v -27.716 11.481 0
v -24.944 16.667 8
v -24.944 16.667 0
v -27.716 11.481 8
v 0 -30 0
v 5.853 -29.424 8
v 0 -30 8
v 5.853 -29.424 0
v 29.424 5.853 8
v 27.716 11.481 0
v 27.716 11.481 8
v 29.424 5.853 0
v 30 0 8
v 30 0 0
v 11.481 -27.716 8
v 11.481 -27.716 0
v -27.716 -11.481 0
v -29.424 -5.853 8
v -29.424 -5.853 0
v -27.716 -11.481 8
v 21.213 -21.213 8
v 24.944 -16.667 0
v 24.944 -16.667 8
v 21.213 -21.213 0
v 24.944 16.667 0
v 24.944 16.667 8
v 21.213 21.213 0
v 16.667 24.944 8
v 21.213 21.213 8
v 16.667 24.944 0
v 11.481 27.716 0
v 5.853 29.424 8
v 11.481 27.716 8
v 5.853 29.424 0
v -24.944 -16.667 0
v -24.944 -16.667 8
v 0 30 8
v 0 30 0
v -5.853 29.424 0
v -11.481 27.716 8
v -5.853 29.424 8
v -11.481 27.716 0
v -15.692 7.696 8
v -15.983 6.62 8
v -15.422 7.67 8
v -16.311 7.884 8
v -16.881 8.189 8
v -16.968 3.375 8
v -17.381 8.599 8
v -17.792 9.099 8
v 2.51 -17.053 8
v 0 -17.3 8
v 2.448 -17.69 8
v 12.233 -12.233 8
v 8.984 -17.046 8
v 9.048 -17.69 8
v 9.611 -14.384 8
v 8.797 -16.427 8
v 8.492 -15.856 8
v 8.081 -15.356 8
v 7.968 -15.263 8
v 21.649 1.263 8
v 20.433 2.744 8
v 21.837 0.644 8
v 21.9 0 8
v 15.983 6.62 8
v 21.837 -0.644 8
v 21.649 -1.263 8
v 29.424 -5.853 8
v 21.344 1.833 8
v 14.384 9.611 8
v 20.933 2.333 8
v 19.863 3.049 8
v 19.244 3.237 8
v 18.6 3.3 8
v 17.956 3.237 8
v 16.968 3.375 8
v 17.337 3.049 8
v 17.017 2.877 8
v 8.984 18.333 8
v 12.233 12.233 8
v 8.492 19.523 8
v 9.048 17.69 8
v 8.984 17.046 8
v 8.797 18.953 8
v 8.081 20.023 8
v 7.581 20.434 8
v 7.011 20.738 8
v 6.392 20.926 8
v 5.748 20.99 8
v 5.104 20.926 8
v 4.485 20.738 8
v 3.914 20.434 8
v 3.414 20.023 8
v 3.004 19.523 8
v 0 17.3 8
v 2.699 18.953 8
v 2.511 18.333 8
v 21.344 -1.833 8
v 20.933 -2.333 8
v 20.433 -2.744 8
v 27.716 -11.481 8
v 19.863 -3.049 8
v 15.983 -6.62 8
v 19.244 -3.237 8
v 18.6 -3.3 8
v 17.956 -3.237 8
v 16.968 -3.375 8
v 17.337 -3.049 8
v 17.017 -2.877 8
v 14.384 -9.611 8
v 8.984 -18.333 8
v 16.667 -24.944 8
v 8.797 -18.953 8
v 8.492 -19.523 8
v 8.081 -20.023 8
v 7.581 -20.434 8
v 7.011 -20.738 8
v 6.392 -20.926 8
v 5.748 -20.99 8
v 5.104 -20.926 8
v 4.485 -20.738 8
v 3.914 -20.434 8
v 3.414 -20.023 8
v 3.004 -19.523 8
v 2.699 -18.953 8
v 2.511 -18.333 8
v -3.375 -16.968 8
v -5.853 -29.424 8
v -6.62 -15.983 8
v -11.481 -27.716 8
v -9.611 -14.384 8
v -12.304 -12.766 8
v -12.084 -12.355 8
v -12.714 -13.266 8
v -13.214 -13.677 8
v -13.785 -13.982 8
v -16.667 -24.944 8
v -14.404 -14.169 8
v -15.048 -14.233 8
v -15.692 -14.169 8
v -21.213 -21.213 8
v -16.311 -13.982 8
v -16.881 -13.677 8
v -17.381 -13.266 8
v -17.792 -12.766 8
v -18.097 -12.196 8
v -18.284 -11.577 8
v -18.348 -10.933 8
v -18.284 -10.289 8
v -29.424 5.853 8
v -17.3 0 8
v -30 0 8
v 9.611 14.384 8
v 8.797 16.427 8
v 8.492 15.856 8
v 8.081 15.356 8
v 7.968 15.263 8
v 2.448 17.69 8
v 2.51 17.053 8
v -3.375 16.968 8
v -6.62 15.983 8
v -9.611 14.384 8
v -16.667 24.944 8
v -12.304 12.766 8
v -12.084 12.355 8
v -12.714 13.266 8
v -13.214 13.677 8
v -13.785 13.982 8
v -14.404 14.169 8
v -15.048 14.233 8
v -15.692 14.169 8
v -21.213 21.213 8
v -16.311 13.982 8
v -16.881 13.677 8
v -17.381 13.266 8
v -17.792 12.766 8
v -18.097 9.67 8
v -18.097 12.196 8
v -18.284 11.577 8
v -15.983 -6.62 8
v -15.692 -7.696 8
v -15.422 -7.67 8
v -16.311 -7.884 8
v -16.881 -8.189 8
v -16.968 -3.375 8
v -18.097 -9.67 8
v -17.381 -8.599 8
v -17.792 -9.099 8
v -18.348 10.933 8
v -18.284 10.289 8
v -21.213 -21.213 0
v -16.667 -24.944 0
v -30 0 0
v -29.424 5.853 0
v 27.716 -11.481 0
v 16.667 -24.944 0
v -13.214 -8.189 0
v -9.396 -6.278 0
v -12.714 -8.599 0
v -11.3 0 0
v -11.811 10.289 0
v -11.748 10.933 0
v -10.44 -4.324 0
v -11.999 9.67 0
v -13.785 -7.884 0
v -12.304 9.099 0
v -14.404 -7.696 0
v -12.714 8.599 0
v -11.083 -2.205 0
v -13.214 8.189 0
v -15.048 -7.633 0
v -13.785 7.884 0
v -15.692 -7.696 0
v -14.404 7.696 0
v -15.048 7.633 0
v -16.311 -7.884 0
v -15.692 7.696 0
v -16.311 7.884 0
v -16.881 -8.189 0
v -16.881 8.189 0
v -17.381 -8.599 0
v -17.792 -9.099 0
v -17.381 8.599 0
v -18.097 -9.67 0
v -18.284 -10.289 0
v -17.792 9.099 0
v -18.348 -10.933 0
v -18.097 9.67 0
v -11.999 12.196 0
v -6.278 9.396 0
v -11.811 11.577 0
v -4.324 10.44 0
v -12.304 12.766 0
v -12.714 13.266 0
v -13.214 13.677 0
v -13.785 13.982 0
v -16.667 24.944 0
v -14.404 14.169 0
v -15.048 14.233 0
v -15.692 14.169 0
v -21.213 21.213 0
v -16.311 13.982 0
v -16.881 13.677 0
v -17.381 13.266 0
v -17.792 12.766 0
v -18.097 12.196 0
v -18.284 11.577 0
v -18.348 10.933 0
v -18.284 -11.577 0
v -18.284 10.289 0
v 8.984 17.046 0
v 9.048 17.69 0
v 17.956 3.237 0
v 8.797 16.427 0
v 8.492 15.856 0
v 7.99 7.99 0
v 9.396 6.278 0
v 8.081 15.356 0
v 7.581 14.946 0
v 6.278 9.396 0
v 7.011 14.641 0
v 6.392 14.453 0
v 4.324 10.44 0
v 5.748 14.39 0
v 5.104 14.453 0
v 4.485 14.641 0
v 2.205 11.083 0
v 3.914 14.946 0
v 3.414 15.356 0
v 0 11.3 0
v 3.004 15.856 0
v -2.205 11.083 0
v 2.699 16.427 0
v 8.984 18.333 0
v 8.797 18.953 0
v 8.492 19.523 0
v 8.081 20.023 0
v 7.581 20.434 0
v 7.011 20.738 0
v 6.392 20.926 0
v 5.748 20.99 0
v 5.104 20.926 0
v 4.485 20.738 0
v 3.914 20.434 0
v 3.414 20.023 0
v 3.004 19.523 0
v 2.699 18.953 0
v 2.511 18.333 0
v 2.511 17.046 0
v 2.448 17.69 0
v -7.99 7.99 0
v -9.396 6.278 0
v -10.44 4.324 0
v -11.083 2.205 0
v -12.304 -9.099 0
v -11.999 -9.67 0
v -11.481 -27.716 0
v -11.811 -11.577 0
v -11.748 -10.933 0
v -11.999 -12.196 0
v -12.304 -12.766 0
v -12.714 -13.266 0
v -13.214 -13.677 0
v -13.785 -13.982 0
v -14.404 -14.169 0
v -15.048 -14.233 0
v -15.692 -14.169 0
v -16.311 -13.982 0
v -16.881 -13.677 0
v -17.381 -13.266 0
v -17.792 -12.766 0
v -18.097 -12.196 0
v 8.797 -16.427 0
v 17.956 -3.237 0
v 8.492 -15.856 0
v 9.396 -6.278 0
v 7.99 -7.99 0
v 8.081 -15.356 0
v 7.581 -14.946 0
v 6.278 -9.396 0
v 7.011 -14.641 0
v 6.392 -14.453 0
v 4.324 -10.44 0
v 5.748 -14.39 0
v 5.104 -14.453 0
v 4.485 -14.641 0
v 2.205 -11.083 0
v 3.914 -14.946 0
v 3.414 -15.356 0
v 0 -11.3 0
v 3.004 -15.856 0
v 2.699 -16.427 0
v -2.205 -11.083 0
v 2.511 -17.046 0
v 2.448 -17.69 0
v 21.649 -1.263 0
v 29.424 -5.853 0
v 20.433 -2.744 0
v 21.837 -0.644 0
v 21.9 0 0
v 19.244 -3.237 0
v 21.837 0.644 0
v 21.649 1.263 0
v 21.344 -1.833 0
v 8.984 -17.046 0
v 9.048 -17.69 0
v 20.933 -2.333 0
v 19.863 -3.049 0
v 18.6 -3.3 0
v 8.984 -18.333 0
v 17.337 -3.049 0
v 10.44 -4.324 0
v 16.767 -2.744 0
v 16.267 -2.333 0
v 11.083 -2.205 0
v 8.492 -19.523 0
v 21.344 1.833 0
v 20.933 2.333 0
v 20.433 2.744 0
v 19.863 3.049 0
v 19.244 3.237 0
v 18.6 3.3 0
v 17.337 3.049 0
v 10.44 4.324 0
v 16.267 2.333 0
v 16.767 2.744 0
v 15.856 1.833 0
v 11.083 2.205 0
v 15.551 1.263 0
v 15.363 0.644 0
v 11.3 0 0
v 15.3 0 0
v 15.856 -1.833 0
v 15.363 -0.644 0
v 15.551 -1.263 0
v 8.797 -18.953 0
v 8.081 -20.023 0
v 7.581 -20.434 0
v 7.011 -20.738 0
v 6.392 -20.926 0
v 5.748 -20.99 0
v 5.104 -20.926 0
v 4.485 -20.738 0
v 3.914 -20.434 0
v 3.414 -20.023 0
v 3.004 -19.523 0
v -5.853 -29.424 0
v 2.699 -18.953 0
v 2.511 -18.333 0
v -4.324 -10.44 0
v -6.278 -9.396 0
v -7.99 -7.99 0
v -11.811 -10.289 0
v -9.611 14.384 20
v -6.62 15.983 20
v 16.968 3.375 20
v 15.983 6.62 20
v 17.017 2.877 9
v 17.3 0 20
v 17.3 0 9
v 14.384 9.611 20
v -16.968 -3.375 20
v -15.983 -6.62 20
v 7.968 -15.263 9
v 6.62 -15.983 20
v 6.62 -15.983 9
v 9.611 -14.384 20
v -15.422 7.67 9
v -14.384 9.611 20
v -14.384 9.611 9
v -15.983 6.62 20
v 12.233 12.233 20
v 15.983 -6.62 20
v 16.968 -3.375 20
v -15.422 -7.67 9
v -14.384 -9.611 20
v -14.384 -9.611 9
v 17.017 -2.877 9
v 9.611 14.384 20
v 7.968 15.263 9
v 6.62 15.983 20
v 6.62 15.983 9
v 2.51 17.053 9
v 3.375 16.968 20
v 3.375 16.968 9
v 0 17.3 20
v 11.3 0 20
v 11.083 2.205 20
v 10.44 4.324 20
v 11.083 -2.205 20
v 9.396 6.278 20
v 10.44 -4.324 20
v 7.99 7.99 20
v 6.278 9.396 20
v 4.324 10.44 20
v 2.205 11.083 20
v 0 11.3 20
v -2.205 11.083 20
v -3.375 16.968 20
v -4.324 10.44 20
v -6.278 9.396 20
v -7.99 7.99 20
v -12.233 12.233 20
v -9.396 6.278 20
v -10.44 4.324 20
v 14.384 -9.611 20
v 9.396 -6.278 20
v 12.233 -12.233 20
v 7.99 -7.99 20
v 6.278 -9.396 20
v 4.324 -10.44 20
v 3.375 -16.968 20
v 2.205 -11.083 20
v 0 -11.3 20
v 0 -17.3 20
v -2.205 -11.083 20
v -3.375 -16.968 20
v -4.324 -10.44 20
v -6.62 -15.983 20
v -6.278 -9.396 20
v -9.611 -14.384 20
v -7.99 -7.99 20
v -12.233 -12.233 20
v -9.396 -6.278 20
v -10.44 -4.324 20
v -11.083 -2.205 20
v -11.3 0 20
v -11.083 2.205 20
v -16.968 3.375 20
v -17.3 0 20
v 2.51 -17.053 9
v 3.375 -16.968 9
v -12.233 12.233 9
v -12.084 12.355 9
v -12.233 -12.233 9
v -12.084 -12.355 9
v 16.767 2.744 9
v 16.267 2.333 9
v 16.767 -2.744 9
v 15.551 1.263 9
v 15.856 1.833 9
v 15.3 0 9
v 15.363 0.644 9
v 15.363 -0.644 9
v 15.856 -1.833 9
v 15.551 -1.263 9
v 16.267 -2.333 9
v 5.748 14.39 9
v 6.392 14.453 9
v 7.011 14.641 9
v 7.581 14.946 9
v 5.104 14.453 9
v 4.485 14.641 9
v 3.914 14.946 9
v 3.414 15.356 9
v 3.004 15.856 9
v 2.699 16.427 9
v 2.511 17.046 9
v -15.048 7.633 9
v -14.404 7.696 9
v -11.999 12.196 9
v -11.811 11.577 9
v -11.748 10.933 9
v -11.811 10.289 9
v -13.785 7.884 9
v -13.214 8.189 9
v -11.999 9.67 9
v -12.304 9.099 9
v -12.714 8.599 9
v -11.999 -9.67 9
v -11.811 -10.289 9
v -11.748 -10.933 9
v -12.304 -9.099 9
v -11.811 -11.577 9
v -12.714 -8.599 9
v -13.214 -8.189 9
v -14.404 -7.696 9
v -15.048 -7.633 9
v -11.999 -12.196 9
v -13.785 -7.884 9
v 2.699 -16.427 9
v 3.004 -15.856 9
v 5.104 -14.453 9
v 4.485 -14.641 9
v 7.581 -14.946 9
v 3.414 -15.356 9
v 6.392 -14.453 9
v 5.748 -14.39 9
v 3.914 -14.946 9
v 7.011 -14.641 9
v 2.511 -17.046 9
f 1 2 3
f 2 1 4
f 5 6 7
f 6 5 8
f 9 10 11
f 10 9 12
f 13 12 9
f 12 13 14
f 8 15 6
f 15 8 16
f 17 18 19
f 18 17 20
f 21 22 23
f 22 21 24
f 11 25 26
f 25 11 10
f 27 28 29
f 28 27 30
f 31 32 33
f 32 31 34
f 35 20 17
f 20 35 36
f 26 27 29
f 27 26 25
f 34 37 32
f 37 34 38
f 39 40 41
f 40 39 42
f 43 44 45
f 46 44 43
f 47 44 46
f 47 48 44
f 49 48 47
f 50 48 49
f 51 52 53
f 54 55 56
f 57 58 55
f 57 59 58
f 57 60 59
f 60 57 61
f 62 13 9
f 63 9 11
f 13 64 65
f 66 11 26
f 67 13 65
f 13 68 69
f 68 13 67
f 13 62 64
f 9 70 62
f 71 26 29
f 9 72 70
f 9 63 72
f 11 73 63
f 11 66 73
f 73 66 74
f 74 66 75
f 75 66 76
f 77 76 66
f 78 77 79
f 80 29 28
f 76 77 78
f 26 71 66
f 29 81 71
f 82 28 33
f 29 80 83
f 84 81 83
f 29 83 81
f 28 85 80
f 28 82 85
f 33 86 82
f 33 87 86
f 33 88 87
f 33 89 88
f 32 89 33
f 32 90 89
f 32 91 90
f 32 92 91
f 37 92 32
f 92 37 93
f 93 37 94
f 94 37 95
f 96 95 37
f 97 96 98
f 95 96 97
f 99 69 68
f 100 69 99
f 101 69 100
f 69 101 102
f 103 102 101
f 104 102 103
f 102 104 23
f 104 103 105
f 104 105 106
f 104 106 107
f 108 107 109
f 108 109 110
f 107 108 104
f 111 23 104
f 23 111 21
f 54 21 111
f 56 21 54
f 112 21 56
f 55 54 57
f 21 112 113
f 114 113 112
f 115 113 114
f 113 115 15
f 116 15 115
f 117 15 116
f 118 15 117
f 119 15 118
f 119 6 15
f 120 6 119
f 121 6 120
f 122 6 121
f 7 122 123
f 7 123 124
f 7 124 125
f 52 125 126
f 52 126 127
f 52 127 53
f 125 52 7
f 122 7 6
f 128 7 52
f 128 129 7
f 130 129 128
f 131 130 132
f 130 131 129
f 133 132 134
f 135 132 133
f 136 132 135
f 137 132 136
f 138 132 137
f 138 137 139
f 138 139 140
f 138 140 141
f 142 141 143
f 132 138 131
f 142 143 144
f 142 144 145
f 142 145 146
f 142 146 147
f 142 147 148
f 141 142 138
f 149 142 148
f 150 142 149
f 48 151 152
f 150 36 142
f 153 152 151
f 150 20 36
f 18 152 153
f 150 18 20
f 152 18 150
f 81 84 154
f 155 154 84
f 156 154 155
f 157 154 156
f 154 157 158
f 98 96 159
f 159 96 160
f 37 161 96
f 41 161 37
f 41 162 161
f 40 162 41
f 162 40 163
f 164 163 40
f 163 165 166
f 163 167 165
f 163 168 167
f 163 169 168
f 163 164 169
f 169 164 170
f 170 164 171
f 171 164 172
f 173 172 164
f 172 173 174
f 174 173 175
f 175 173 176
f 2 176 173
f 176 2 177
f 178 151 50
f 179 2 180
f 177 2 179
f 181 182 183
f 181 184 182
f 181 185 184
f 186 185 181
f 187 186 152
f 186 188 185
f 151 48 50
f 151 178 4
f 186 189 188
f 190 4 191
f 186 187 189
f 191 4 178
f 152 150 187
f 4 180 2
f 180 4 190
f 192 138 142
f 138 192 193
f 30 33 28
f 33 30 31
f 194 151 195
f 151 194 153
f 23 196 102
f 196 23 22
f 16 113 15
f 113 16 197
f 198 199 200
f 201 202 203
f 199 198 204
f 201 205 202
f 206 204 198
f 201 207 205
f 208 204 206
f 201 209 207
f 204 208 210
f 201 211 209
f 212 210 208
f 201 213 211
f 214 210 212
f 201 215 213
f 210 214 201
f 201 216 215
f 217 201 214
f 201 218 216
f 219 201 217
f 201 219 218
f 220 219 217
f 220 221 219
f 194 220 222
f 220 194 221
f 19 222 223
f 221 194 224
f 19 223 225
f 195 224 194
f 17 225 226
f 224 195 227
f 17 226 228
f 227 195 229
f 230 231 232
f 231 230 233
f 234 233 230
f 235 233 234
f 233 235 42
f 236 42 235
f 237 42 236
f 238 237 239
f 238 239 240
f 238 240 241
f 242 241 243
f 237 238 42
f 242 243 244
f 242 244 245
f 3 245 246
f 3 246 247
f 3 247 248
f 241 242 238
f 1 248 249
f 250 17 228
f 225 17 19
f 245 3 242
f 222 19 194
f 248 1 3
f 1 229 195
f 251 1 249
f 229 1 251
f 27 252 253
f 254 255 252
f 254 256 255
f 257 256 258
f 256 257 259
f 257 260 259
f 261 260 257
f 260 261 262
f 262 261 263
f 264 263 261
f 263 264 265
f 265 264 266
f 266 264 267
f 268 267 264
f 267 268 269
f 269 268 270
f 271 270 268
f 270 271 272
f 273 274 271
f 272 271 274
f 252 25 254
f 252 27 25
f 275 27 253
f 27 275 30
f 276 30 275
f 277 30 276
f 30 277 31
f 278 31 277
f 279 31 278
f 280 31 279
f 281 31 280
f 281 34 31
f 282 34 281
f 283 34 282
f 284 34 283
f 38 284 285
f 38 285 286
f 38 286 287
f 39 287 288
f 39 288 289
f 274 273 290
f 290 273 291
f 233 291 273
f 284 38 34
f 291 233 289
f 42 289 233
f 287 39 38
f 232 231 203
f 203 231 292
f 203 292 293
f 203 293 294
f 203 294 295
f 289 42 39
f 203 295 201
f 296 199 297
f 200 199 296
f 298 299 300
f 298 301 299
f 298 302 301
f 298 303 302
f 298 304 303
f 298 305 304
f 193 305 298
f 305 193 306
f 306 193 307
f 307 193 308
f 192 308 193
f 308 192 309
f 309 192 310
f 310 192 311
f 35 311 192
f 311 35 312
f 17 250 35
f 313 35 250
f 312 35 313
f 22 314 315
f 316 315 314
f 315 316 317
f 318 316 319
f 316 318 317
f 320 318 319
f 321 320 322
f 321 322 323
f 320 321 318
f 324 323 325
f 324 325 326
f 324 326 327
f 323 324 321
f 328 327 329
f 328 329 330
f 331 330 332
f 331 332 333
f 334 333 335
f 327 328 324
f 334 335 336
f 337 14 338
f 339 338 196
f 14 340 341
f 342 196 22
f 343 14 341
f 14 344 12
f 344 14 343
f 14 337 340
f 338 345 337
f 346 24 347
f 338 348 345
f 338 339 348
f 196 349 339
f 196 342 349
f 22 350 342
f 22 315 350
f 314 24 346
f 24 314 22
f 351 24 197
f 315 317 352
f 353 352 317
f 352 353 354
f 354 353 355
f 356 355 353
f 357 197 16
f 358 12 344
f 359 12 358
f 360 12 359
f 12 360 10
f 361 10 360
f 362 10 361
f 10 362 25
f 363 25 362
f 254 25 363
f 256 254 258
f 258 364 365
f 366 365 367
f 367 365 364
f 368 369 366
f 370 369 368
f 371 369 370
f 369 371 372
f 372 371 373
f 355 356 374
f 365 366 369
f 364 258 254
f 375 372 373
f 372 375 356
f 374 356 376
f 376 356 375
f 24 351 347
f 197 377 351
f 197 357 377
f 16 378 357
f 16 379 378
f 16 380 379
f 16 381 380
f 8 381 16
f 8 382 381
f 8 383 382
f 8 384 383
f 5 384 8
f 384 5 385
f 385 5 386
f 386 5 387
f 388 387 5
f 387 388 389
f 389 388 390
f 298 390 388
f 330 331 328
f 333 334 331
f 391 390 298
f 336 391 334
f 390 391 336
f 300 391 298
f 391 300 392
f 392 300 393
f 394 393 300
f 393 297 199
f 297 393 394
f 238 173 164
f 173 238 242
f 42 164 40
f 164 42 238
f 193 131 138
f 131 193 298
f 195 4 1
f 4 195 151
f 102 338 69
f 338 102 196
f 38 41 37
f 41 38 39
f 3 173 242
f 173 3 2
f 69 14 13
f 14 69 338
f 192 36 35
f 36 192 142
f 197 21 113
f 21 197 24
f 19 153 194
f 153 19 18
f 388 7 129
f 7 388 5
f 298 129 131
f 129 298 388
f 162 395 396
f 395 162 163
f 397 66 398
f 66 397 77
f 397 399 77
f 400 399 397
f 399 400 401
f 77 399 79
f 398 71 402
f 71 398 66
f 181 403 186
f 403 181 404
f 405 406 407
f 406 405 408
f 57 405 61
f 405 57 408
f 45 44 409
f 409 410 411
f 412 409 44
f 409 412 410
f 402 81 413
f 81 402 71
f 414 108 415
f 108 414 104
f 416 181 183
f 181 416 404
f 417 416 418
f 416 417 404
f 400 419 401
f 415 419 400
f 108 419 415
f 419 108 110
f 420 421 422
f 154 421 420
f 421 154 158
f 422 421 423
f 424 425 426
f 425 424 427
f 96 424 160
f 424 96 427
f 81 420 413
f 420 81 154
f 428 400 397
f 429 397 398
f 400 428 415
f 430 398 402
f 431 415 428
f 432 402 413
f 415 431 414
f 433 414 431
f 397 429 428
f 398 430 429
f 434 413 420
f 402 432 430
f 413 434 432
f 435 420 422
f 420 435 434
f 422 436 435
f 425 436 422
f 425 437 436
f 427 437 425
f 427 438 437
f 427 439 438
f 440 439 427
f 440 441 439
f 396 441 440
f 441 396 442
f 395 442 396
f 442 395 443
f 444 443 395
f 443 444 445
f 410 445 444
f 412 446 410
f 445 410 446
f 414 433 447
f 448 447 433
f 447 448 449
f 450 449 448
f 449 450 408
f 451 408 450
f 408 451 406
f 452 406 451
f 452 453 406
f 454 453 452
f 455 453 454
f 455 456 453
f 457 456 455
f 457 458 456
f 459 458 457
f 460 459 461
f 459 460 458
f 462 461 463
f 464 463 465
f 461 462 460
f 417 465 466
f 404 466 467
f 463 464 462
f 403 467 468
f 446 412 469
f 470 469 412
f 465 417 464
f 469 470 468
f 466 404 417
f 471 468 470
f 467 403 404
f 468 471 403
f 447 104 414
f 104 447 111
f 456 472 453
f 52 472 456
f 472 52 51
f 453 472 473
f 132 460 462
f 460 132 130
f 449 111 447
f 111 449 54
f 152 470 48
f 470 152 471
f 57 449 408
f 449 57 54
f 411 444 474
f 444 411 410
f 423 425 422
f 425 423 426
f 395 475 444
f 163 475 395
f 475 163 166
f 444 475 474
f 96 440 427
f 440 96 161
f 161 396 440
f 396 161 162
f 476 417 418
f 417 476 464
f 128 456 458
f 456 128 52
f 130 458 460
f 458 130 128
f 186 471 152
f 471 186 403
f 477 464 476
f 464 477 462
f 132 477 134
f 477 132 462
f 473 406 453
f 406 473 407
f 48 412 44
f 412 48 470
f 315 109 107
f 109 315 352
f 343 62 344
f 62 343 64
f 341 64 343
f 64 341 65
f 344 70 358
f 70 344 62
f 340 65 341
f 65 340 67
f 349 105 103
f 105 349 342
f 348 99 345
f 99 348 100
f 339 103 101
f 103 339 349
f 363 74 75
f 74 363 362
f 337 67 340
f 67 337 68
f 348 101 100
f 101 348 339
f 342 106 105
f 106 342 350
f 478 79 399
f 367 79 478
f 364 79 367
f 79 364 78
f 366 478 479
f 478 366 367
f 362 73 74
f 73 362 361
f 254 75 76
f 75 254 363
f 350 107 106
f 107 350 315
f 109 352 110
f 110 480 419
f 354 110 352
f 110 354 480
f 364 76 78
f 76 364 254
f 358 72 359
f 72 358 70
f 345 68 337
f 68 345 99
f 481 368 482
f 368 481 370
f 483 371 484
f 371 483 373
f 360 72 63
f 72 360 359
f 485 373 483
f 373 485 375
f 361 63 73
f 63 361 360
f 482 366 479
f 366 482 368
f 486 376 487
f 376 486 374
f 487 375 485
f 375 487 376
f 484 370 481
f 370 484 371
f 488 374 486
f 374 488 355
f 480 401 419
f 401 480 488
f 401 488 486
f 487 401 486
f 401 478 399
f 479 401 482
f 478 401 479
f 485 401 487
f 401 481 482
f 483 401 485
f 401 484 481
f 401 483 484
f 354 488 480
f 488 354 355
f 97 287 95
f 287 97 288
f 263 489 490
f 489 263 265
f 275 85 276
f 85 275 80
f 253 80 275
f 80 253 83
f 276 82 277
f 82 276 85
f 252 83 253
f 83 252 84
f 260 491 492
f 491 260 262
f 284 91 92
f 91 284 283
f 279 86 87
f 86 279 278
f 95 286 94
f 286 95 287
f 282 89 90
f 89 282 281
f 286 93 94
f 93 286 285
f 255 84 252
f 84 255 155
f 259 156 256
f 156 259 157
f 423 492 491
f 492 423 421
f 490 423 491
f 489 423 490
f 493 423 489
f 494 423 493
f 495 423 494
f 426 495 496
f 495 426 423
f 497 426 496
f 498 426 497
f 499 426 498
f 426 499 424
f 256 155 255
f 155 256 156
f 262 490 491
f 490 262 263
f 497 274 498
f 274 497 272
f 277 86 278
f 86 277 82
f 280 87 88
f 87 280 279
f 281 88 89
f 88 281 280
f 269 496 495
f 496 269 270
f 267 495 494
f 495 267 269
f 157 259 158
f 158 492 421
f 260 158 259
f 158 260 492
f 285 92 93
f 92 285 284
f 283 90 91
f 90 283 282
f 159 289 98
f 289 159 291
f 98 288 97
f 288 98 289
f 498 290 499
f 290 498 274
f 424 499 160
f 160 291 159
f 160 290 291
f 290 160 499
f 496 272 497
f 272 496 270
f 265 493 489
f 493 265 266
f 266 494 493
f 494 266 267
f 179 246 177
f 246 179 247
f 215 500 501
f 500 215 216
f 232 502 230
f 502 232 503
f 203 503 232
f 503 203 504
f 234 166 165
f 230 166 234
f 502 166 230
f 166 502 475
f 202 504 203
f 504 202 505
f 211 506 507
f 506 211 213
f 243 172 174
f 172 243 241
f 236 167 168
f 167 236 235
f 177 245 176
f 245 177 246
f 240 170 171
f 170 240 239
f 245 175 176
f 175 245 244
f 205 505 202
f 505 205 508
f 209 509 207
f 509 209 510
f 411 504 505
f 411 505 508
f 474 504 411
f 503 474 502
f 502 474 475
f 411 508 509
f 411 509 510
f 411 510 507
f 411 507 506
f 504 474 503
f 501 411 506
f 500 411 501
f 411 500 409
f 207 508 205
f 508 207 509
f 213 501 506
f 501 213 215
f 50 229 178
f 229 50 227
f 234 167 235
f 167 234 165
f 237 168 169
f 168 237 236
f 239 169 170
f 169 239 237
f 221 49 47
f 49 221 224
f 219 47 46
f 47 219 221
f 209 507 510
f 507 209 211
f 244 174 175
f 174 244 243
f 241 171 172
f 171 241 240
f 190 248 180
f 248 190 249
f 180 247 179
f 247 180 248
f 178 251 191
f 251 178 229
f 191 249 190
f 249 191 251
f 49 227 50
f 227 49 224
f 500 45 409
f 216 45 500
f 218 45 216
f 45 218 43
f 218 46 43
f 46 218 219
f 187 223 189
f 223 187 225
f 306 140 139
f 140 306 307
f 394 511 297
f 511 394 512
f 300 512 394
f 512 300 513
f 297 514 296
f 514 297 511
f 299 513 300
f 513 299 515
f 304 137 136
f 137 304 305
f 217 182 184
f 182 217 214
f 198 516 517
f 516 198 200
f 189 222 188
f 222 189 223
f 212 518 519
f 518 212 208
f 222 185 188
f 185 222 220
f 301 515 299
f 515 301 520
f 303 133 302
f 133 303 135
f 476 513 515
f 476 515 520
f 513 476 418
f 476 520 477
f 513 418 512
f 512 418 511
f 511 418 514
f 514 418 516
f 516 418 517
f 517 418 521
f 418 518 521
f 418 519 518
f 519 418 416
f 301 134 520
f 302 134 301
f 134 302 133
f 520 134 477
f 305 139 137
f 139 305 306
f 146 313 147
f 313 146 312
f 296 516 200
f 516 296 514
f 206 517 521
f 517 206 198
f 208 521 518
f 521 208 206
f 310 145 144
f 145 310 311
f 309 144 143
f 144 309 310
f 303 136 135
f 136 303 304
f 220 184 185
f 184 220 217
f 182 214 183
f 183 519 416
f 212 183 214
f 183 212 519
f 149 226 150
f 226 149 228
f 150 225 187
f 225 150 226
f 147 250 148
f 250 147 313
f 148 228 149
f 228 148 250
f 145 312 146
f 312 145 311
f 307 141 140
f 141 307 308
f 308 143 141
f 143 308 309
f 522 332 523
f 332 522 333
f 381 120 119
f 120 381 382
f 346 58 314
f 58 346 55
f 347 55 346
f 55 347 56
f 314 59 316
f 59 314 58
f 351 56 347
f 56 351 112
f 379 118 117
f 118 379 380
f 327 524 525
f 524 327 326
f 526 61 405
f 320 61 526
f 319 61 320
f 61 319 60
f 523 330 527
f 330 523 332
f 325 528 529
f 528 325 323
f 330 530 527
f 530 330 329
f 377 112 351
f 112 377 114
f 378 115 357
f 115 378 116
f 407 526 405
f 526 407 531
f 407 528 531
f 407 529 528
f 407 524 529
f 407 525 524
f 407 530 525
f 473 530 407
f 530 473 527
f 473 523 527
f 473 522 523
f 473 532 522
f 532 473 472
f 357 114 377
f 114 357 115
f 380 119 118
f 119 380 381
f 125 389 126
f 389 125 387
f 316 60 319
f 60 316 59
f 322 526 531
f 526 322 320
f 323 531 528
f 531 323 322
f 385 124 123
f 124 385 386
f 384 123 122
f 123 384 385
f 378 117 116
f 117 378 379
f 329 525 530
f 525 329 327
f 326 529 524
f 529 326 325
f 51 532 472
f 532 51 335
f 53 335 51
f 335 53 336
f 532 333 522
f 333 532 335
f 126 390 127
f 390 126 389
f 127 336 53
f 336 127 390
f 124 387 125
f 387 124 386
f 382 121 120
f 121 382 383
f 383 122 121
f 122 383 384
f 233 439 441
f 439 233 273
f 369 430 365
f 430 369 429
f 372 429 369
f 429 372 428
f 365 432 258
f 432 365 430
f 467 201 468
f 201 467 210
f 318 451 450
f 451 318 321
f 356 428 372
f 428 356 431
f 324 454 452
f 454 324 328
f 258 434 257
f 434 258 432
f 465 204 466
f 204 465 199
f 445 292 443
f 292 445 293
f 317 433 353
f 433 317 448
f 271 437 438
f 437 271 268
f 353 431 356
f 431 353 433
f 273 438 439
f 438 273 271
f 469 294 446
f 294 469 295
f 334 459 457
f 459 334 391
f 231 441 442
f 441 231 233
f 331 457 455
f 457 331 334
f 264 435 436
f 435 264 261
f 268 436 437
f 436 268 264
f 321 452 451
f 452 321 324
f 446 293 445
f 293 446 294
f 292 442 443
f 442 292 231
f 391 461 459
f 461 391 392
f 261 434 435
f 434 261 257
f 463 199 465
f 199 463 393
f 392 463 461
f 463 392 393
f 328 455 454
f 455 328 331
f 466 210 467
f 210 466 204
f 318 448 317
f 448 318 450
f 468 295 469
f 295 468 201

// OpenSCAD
$fn = 32;

// ----------------------------------------------------------------------
// Flange Ø60 x 8
// 5 holes on a Ø37.2 bolt circle, bolted joints
// ----------------------------------------------------------------------

// --- parameters (mm) ---
flange_d = 60;  // outside diameter of the flange
thickness = 8;  // flange thickness
holes = 5;      // number of bolt holes
pcd = 37.2;     // bolt circle diameter
start_deg = 0;  // angle of the first hole, from +X
hole_d = 6.6;   // bolt hole diameter
bore_d = 22.6;  // central through bore
hub_d = 34.6;   // hub outside diameter
hub_h = 12;     // hub height above the flange face (0 = no hub)

// --- derived feature positions (mm) ---
height = thickness + hub_h;  // = 20   overall height of the part
pcd_r = pcd / 2;             // = 18.6   bolt circle radius
hole_step = 360 / holes;     // = 72   angular pitch
feature_centers = [
  [pcd_r * cos(start_deg + 0 * hole_step), pcd_r * sin(start_deg + 0 * hole_step)],
  [pcd_r * cos(start_deg + 1 * hole_step), pcd_r * sin(start_deg + 1 * hole_step)],
  [pcd_r * cos(start_deg + 2 * hole_step), pcd_r * sin(start_deg + 2 * hole_step)],
  [pcd_r * cos(start_deg + 3 * hole_step), pcd_r * sin(start_deg + 3 * hole_step)],
  [pcd_r * cos(start_deg + 4 * hole_step), pcd_r * sin(start_deg + 4 * hole_step)]
];   // bolt hole centres on the pitch circle

// flange disc, every hole and the bore cut straight through
difference() {
  union() {
    cylinder(d = flange_d, h = thickness);
    cylinder(d = hub_d, h = height);  // hub, overlapped into the flange
  }
  translate([0, 0, -1]) cylinder(d = bore_d, h = height + 2);  // bore, through
  for (centre = feature_centers)
    translate([centre[0], centre[1], -1]) cylinder(d = hole_d, h = thickness + 2);
}
